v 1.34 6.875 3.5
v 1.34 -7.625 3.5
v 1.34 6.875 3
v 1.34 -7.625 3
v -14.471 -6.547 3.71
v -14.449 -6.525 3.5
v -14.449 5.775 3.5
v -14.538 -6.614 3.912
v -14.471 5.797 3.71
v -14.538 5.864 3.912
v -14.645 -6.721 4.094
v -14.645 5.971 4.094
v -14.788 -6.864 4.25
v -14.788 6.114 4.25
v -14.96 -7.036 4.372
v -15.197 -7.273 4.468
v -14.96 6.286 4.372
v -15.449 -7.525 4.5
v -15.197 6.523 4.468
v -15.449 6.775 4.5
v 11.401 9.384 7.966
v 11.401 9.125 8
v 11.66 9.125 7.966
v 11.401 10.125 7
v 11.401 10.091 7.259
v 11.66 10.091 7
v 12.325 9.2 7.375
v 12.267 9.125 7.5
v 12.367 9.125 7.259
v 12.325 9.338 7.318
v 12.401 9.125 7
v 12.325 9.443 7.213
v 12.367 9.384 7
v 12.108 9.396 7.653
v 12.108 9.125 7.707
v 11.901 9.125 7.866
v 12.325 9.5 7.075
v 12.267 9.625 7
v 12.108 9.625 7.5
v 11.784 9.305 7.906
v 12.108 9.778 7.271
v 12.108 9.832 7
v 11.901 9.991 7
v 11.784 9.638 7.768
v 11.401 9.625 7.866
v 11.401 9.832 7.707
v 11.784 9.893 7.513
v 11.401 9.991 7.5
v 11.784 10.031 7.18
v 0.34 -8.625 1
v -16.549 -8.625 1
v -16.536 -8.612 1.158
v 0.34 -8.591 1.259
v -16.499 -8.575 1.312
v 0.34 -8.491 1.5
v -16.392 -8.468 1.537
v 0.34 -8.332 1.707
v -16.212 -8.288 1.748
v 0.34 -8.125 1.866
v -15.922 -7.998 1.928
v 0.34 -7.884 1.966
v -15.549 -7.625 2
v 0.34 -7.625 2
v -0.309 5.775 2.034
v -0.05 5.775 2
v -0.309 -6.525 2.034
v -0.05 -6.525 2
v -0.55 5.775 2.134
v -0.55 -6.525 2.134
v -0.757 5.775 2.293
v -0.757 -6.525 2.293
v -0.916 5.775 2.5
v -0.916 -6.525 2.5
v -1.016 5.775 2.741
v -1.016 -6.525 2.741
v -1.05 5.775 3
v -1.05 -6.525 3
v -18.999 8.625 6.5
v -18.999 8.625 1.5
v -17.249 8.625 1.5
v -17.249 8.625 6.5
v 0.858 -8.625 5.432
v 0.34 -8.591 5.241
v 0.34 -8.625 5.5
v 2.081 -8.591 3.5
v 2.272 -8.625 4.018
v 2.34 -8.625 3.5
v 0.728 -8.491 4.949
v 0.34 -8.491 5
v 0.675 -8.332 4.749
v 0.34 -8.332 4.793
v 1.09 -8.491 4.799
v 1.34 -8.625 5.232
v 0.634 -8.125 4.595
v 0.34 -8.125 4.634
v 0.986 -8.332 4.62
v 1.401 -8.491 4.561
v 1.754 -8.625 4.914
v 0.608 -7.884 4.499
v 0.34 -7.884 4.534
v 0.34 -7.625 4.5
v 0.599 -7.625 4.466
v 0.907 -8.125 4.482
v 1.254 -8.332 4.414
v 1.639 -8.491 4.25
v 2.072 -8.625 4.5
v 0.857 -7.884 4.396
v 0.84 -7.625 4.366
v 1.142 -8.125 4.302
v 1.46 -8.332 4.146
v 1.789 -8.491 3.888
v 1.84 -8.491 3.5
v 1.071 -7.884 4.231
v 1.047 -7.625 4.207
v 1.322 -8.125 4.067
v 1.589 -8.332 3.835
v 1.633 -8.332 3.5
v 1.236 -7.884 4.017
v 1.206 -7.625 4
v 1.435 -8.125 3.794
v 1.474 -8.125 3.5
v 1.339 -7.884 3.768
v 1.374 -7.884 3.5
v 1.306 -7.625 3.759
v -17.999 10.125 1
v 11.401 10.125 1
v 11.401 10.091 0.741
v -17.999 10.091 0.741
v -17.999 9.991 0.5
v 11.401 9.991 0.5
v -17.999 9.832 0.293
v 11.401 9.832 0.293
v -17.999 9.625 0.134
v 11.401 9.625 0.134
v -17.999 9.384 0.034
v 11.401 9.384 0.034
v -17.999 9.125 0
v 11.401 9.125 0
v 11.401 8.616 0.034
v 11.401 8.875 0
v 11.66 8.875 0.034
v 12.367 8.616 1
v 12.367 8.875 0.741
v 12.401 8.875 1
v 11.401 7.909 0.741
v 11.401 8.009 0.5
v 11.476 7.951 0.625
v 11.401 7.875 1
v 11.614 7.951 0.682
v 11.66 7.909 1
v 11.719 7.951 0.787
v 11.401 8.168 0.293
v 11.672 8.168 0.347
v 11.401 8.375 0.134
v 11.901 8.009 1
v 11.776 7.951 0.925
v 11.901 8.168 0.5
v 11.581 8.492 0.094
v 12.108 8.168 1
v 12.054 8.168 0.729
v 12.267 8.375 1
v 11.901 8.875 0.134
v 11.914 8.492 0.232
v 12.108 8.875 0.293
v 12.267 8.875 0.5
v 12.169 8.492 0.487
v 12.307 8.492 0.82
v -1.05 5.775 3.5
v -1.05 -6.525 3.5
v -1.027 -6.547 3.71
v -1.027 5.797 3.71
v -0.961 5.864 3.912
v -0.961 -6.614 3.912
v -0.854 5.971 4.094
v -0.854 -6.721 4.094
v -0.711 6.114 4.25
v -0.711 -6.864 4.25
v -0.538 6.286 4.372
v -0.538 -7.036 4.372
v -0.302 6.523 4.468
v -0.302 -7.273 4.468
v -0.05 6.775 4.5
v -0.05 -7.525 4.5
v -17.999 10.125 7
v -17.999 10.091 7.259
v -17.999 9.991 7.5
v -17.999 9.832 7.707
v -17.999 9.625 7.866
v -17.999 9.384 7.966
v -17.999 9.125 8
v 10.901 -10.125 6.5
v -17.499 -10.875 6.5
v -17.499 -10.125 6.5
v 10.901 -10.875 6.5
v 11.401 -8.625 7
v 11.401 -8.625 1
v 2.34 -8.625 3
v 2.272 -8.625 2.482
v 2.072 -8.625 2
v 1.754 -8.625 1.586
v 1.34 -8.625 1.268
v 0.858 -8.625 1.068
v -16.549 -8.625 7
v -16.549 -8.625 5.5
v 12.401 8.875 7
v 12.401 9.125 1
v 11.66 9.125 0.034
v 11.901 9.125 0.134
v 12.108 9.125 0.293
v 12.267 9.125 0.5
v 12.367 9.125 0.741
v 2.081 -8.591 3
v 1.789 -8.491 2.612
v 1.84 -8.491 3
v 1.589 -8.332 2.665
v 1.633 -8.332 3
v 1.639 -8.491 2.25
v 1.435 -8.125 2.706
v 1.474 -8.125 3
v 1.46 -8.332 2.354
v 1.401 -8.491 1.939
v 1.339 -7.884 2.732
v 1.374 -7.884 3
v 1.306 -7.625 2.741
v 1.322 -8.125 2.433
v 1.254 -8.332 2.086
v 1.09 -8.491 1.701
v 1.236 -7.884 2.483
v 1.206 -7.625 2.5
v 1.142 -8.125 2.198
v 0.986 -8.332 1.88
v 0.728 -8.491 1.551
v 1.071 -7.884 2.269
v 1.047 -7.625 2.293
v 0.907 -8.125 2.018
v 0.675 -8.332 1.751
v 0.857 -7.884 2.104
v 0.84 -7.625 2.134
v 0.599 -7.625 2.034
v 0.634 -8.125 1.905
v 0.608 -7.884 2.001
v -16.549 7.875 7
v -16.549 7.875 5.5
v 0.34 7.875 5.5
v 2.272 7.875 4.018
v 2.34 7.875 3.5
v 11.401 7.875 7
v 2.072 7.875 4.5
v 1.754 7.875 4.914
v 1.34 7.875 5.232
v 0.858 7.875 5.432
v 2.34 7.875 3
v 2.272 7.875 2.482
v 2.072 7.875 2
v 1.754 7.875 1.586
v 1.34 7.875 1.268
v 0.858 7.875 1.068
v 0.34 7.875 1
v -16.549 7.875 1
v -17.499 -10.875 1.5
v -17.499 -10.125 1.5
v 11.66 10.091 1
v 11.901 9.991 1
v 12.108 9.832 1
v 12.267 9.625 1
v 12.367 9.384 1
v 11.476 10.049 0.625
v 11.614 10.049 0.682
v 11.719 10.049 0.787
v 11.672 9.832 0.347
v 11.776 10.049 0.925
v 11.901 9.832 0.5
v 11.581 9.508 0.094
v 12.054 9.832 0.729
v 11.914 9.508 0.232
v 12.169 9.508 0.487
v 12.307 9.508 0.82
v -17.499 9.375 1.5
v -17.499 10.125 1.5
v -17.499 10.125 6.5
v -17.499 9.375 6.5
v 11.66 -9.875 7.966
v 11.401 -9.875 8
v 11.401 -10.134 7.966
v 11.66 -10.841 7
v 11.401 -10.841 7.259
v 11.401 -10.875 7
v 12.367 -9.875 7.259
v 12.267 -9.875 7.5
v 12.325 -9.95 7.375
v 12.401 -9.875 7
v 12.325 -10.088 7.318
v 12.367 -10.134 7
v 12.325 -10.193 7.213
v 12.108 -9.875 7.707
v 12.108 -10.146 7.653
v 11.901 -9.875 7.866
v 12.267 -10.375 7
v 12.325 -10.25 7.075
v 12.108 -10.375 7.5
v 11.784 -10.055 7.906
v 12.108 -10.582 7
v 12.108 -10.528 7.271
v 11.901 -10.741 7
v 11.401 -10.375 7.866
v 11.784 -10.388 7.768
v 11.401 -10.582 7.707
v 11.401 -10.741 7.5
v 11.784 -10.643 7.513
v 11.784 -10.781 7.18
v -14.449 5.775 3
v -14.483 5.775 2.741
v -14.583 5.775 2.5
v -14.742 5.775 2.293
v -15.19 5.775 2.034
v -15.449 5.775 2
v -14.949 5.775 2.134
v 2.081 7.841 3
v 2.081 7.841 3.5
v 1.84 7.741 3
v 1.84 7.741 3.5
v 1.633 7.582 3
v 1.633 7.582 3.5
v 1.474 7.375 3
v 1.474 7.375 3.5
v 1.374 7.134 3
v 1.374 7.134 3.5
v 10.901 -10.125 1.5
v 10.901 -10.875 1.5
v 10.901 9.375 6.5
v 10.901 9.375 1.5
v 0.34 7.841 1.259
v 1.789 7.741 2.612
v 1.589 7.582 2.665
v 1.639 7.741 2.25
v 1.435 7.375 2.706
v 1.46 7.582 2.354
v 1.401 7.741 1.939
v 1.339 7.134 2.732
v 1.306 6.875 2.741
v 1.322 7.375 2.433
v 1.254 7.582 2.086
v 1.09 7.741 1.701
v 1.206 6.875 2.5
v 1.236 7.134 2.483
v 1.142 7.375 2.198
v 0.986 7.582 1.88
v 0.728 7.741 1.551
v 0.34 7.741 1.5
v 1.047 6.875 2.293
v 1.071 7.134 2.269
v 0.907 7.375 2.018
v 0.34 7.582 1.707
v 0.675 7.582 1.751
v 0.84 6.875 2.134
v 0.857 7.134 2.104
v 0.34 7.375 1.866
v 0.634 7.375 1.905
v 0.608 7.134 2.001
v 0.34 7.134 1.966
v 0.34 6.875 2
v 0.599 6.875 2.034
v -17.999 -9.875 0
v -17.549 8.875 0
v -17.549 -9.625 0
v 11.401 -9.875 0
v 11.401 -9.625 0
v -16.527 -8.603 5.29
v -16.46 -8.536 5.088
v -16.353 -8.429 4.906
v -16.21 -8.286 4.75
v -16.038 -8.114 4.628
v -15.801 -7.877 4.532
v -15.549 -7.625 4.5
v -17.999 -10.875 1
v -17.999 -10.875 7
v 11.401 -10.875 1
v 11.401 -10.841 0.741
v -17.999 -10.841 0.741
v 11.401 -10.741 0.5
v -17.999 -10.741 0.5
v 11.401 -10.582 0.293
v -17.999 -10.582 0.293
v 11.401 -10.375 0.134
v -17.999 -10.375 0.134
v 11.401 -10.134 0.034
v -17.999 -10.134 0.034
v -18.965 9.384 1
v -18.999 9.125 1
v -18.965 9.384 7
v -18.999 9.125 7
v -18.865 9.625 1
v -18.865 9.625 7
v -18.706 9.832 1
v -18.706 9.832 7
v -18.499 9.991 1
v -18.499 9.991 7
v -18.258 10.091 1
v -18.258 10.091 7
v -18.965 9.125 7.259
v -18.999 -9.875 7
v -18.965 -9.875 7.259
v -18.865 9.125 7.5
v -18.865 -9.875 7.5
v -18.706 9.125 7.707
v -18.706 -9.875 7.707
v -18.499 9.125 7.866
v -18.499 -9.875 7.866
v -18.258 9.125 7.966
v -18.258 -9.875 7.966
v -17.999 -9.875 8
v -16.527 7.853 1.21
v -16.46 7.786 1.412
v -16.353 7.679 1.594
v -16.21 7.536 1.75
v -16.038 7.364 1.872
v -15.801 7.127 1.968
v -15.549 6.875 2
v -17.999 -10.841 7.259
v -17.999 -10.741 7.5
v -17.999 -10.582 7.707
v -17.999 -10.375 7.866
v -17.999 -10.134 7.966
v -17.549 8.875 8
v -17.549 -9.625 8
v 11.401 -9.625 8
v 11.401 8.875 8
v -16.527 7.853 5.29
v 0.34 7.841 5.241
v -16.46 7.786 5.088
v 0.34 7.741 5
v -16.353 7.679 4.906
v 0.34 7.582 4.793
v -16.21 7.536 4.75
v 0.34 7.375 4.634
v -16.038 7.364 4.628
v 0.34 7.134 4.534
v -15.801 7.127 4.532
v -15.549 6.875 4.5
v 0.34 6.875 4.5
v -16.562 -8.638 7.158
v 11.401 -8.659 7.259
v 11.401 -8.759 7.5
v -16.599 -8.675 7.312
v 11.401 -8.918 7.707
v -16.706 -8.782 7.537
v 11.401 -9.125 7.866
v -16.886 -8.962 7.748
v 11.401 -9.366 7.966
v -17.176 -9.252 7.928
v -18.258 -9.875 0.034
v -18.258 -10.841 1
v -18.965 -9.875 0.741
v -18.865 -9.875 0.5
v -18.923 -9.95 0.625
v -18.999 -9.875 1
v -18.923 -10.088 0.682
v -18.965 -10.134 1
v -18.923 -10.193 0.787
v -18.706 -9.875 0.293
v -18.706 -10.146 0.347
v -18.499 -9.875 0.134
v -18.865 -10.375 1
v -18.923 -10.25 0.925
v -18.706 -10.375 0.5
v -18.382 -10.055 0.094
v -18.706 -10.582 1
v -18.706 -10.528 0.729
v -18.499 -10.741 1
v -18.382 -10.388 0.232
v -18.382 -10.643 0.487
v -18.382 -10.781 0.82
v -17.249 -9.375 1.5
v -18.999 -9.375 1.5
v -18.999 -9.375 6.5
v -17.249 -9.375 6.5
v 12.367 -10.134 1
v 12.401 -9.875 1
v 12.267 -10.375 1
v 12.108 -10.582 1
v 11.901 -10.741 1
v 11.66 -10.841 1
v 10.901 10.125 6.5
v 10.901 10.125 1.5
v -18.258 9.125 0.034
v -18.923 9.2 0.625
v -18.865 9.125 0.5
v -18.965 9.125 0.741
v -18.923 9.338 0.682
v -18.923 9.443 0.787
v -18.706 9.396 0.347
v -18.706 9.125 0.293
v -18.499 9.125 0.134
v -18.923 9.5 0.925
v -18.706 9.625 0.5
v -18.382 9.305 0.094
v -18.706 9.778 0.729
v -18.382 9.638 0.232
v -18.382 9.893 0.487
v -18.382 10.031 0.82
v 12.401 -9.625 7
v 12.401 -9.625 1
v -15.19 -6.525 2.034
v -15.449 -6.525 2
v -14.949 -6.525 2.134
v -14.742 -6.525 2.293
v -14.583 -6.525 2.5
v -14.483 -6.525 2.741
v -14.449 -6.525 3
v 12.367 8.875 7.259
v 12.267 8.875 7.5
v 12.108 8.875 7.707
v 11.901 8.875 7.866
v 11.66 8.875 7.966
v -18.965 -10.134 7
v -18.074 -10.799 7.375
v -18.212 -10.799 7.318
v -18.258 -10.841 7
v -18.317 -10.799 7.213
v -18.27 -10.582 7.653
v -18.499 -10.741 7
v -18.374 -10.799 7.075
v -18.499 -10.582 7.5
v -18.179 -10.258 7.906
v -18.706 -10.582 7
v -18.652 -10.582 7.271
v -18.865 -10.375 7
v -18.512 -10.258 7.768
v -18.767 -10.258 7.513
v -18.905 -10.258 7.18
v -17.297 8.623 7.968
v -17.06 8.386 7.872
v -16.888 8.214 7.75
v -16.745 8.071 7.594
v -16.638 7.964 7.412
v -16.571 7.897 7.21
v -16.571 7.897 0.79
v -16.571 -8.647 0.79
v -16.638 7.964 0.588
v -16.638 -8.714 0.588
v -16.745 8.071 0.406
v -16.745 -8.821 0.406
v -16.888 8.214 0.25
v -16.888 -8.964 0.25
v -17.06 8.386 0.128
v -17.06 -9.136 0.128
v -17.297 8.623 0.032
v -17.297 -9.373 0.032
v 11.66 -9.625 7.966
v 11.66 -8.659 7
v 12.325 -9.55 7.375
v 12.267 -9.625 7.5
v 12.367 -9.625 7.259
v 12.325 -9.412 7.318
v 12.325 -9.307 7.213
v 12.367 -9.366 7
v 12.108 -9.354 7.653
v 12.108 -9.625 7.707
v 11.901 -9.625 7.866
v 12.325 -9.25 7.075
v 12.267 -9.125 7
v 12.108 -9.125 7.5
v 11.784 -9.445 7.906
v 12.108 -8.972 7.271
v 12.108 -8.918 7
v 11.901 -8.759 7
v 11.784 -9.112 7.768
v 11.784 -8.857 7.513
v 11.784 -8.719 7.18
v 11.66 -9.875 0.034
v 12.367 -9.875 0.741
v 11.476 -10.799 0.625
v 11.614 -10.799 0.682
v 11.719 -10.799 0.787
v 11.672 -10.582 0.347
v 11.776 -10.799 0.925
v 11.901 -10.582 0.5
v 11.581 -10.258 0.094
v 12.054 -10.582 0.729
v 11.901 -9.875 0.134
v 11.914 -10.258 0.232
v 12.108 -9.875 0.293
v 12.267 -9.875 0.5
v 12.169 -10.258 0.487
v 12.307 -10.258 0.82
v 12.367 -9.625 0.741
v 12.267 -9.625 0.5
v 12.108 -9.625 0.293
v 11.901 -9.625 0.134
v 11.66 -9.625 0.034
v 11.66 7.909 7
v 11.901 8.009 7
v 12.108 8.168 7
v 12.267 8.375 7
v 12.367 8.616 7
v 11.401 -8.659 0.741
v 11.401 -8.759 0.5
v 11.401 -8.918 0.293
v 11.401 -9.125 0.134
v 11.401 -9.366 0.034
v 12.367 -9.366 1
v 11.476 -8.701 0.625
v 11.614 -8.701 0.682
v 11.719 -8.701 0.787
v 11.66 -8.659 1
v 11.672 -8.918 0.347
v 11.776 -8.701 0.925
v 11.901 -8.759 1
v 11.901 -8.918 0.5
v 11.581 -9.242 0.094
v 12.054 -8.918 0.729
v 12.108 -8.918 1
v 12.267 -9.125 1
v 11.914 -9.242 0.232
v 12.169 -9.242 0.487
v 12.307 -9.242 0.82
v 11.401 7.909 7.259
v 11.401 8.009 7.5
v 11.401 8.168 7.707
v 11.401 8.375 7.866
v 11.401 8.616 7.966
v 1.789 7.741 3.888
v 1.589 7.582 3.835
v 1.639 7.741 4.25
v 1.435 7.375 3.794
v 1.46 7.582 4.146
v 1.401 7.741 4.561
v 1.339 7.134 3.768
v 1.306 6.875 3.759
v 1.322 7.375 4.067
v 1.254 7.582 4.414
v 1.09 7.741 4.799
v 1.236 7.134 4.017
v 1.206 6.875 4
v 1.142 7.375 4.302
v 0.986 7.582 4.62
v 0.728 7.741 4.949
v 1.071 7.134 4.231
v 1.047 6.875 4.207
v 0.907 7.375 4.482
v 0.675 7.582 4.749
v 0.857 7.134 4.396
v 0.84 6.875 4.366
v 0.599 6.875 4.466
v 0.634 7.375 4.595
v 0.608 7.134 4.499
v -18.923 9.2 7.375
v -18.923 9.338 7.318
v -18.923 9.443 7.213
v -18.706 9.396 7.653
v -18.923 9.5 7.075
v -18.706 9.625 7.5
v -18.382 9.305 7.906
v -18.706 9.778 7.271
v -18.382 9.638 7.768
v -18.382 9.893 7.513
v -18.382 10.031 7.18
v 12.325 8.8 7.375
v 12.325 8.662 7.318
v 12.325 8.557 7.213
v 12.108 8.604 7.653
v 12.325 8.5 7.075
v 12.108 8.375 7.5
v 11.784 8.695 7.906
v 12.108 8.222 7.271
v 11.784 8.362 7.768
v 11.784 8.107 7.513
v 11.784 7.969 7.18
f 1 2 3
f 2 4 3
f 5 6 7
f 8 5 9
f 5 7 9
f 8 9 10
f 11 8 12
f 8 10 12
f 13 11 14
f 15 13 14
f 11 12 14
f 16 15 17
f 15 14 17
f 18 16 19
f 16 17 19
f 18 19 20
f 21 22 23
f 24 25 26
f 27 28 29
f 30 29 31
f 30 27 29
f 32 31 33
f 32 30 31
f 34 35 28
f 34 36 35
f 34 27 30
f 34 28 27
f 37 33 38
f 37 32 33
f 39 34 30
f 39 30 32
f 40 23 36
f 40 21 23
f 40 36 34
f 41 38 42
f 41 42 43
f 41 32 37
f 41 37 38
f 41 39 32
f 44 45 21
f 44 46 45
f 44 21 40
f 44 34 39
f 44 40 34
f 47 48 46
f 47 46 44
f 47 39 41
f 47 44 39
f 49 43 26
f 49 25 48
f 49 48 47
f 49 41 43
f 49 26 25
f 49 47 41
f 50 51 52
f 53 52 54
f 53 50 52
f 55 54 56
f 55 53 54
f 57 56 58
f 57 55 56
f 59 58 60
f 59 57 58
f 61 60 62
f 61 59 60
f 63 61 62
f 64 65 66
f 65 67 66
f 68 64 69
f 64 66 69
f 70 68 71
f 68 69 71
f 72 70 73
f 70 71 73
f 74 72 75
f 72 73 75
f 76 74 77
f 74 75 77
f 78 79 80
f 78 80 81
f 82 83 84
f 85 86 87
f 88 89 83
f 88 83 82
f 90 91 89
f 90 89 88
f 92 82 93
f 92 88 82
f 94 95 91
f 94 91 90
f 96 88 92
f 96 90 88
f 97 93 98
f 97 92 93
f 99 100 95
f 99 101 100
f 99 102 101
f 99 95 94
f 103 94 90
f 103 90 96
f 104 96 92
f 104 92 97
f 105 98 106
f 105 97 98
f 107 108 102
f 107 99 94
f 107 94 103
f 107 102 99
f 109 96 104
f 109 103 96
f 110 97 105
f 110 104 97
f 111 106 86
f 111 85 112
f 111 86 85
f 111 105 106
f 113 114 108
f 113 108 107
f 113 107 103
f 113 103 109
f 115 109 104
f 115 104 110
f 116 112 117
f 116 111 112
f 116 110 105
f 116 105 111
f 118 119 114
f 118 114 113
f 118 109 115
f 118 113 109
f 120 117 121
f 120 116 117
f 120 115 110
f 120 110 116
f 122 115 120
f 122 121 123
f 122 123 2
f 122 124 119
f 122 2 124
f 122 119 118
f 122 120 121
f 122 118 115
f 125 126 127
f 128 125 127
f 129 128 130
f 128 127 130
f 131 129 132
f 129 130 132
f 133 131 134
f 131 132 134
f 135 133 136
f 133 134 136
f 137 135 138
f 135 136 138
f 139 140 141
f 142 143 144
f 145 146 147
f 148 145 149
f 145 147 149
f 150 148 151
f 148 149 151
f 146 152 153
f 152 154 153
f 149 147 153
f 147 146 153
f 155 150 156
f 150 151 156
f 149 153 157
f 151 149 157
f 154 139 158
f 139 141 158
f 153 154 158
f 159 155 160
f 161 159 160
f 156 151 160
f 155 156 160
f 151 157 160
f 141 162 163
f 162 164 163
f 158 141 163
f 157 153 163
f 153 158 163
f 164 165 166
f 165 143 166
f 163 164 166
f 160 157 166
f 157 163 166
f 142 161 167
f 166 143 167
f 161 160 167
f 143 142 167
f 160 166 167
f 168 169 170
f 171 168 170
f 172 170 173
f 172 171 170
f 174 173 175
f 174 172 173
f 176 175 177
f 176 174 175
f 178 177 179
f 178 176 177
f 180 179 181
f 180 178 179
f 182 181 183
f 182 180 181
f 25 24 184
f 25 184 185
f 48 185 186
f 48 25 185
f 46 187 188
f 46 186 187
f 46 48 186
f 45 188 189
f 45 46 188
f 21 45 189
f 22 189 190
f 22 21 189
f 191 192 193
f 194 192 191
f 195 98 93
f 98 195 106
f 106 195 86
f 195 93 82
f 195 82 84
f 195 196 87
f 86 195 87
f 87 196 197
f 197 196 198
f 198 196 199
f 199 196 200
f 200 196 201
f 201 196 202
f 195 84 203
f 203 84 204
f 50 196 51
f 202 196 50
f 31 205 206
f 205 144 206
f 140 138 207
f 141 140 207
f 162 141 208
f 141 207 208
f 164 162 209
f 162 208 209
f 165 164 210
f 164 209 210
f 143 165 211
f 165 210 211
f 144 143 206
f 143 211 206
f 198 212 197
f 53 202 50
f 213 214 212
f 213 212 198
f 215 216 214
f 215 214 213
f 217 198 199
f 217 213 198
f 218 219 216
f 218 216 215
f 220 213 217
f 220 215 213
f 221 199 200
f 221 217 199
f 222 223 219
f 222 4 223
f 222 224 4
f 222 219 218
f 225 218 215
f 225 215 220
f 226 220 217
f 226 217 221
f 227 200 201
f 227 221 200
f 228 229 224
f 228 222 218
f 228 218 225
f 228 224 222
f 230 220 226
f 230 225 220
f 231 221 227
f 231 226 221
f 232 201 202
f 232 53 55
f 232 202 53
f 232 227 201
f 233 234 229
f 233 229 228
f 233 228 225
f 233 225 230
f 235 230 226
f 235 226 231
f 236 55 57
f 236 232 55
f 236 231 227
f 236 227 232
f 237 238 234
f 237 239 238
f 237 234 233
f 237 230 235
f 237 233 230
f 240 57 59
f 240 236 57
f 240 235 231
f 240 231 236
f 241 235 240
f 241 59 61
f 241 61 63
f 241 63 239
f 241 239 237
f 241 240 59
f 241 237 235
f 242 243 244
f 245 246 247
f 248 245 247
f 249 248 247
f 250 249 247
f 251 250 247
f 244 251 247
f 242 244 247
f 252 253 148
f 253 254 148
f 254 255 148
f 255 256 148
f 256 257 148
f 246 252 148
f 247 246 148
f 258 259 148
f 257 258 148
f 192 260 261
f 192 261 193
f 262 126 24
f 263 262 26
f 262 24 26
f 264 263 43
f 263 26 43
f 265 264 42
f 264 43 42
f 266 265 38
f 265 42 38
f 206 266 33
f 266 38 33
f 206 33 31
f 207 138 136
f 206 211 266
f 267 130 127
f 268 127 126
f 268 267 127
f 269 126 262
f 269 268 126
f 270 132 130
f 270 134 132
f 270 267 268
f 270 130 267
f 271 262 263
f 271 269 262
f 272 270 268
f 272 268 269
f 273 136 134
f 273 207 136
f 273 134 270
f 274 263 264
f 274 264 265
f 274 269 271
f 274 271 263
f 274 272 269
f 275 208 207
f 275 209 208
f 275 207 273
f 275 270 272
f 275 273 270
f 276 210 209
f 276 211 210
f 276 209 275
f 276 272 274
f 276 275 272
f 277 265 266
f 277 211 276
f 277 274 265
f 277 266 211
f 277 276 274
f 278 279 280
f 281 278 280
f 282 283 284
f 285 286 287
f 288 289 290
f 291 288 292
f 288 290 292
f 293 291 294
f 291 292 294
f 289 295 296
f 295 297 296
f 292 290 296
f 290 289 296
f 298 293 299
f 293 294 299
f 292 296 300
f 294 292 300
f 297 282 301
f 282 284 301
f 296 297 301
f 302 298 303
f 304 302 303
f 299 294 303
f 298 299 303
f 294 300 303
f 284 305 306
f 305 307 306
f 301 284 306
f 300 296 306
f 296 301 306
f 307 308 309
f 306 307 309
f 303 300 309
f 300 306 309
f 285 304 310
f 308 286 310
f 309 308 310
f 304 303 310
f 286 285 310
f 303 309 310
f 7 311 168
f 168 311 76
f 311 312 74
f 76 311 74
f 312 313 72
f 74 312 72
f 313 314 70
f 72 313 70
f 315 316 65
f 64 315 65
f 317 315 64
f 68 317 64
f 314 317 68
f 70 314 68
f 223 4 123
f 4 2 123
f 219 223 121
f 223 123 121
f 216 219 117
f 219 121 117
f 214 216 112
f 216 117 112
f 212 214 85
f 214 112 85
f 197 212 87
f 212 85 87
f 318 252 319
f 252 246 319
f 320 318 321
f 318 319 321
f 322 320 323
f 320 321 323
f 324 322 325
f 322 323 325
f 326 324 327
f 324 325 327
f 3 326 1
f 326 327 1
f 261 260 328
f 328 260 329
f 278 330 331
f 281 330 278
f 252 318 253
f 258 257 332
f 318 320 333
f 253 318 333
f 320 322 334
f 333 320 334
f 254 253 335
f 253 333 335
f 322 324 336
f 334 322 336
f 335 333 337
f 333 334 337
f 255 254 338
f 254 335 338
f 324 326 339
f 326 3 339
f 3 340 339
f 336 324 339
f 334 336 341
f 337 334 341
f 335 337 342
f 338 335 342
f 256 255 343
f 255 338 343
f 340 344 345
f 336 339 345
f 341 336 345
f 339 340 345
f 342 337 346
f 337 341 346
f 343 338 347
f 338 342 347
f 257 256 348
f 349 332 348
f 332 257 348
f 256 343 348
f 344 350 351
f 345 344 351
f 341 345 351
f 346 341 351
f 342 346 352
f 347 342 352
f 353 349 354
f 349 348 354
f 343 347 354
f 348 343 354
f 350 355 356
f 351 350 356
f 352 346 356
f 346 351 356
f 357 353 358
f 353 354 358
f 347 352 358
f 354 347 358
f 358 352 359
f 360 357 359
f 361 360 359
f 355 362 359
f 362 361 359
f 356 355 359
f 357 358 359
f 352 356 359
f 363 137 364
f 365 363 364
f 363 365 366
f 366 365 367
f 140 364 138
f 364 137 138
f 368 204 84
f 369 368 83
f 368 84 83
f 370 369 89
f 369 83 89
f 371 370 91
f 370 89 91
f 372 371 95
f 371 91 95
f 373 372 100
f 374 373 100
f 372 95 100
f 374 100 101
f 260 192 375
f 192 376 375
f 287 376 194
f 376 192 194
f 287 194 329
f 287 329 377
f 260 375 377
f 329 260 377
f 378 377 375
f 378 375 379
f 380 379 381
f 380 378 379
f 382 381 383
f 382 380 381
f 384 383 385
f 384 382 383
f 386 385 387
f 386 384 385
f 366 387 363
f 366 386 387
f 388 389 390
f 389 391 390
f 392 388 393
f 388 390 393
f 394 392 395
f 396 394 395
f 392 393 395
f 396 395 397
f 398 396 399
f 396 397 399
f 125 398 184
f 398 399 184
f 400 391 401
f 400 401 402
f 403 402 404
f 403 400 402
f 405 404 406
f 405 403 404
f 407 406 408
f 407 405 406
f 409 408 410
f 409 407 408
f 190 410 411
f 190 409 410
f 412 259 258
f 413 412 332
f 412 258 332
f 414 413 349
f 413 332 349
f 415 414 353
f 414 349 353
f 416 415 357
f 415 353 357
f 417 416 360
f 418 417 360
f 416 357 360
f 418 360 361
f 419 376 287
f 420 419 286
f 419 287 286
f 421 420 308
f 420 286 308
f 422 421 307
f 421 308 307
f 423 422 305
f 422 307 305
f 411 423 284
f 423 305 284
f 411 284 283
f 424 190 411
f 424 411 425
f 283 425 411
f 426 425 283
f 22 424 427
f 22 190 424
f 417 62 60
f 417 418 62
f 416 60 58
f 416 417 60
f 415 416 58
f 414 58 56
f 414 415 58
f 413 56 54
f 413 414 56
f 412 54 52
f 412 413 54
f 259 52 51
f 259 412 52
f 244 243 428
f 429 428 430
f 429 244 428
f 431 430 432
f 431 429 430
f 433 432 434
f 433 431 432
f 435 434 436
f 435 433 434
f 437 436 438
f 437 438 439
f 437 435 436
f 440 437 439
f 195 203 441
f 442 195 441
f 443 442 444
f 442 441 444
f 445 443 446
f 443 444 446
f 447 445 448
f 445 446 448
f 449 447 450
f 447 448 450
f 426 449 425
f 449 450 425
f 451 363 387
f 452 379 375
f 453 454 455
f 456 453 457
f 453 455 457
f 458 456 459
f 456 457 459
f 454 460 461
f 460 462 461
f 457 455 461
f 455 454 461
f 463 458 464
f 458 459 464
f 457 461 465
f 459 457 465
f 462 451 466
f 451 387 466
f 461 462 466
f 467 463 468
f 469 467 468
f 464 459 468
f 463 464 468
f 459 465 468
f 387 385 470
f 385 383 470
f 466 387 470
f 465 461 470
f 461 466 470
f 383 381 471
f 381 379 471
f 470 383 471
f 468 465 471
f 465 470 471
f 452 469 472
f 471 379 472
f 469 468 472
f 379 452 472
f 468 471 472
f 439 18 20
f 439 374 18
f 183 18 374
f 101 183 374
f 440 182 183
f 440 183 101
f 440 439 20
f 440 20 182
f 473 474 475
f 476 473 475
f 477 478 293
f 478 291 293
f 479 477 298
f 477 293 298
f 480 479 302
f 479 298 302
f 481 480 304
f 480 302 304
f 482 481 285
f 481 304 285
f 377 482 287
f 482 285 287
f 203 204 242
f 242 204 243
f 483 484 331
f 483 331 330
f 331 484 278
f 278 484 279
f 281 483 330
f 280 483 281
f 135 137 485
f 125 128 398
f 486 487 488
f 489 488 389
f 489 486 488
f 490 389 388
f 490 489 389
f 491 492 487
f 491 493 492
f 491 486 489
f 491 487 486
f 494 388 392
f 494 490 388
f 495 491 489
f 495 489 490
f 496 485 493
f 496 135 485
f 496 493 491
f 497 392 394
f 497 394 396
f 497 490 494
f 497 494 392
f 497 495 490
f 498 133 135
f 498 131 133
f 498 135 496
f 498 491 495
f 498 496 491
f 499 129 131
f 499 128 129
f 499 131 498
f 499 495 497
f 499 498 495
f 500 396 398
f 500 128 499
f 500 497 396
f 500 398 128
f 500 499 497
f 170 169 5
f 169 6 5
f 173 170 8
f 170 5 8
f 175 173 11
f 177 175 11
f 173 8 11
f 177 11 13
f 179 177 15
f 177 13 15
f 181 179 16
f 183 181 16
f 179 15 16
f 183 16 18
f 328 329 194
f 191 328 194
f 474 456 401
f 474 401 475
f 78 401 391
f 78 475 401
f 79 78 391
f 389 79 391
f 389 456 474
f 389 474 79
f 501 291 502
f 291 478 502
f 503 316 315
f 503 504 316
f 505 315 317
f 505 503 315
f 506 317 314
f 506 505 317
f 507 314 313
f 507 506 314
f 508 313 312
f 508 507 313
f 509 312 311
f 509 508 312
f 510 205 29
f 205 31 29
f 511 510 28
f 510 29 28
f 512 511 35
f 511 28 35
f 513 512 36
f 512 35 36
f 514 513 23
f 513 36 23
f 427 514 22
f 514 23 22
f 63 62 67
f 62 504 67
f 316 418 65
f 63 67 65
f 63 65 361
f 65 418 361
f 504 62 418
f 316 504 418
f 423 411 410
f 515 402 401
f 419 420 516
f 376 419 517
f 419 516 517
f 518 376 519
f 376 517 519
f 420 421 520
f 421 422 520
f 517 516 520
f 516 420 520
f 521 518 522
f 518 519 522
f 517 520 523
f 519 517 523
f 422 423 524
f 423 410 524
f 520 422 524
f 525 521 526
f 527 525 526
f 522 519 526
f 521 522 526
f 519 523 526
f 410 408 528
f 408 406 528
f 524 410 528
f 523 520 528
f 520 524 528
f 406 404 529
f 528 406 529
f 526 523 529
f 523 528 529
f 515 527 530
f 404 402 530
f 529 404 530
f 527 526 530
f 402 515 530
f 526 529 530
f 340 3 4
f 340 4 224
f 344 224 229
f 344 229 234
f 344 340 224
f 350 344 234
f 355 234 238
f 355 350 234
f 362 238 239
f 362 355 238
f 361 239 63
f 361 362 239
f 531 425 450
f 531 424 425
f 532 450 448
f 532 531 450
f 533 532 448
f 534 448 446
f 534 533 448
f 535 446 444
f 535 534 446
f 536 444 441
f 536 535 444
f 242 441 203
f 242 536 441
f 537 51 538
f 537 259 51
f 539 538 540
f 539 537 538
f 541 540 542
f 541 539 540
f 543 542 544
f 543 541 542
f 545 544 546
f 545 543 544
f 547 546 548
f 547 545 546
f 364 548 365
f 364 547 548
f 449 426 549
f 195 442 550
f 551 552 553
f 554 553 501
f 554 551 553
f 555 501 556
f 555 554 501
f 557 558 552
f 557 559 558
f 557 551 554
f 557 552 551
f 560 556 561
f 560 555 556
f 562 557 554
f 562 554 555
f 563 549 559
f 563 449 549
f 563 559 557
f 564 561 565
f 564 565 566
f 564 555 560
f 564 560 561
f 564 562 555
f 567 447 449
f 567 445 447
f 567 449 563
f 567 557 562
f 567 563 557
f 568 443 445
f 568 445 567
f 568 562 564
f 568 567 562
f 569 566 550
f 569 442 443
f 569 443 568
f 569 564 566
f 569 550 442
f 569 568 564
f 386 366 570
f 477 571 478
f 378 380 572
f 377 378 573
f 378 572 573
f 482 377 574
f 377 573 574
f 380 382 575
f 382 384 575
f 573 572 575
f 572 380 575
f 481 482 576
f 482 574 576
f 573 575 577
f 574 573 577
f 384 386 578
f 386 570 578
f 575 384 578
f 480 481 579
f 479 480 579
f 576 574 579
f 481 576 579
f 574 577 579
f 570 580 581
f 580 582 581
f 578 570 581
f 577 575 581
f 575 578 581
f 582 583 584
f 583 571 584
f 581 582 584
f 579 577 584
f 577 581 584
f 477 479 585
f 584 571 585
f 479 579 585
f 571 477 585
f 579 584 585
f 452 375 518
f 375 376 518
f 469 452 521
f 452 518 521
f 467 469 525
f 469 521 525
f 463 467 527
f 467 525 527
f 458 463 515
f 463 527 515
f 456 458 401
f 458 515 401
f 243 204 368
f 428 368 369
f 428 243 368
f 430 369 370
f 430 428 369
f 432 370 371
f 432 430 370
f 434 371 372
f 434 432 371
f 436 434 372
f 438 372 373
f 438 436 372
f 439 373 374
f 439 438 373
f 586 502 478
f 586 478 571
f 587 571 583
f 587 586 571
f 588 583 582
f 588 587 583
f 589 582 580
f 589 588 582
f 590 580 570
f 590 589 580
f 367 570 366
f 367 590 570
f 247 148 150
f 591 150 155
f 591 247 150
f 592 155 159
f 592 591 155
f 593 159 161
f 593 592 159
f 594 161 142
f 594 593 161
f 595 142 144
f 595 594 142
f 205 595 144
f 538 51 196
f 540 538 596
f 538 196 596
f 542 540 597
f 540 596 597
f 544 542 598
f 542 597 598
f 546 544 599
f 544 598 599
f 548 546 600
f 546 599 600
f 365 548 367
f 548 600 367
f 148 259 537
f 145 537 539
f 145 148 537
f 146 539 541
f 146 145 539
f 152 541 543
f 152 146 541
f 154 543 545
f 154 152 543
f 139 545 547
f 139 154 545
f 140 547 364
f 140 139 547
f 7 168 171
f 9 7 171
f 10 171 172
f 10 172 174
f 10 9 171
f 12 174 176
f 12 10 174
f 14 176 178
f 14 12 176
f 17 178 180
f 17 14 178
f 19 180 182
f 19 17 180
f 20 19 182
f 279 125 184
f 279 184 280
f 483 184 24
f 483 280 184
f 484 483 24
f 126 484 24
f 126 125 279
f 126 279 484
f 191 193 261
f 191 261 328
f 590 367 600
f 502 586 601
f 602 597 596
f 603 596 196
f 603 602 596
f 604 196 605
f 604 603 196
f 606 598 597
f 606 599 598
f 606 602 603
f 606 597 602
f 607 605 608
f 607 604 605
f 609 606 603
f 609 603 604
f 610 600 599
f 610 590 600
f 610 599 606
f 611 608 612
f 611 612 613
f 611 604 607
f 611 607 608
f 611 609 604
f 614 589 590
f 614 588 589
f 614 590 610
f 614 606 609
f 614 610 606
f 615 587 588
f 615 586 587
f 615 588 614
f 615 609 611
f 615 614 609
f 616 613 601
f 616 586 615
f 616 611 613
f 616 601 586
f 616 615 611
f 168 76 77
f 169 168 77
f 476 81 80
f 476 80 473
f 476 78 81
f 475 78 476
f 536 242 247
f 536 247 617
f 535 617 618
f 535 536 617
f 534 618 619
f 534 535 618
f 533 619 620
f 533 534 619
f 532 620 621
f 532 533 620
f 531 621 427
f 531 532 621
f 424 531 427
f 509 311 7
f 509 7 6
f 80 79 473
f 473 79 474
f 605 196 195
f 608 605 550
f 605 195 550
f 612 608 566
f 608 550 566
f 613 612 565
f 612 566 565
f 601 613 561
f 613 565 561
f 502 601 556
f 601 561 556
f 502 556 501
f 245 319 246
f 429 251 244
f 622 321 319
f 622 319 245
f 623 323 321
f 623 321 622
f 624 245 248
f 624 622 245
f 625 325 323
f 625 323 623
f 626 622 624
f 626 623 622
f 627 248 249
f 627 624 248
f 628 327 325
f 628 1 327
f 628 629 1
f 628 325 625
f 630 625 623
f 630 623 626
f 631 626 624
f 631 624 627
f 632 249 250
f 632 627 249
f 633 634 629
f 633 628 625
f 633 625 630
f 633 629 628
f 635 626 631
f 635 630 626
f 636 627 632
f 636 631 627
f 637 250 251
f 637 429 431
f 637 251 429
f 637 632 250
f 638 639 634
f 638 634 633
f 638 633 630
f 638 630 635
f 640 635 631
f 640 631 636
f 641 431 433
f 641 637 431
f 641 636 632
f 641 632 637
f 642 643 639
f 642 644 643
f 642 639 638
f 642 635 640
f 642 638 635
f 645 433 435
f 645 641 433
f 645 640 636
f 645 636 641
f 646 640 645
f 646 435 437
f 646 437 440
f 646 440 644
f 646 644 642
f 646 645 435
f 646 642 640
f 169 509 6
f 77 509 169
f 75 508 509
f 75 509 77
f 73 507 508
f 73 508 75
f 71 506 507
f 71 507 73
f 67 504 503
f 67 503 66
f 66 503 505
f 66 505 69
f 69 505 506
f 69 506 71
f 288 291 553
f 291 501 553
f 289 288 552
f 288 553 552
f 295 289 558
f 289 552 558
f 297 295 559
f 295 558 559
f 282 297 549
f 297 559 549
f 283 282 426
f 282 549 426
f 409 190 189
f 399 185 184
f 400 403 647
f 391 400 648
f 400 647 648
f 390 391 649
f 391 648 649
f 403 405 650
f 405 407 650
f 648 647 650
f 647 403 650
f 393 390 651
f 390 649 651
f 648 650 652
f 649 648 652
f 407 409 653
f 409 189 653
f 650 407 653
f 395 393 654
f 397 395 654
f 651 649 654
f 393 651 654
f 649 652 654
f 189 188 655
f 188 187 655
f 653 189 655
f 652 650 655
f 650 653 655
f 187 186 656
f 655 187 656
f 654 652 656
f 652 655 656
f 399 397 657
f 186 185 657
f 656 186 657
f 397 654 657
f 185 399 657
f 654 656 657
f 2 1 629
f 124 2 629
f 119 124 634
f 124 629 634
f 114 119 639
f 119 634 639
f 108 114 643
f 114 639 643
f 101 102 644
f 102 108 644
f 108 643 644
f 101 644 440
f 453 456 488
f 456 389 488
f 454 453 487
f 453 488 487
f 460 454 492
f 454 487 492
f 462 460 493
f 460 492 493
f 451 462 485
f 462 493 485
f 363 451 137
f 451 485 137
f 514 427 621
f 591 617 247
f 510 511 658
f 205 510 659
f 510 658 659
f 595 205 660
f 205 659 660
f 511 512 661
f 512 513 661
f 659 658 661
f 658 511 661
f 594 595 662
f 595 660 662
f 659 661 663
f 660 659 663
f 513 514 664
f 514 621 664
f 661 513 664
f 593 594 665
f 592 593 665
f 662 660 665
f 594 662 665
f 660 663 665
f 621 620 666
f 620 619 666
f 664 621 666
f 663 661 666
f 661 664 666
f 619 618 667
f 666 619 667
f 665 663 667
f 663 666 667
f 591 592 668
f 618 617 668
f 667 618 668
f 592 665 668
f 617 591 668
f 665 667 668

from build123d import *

# Parameters (mm, degrees)
F0_W      = 33.4
F0_H      = 23
F1_DEPTH  = 8
F0_W_2    = 17.8890476892
F0_H_2    = 16.5
F2_DEPTH  = 4.5
F3_DEPTH  = 1
F4_DEPTH  = 1
F5_DEPTH  = 1
F6_DEPTH  = 1
F7_DEPTH  = 2
F8_W      = 13.3992488682
F8_H      = 12.2999999374
F9_DEPTH  = 3.4
F11_W     = 28.4
F11_H     = 5
F12_DEPTH = 0.75
F13_W     = 28.4
F13_H     = 5
F14_DEPTH = 0.75
F15_W     = 18
F15_H     = 5
F16_DEPTH = 1.75
F10_W     = 16.5
F10_H     = 8
F17_DEPTH = 2.5
F18_R     = 0.99999


# Not quite as in the source:
# - a fillet or chamfer is up to 0.001 mm smaller than in the source, because OpenCascade refuses the exact size
# - a feature names something its author has since deleted; it is built from what else it names


with BuildPart() as f1:
    # F0 (on Top) → F1 (new body)
    with BuildSketch(Plane.XY):
        with Locations((-3.299, -0.375)):
            Rectangle(F0_W, F0_H)
        Polygon((1.3400476892, 7.875), (9.951, 7.875), (9.951, -8.625), (1.3400476892, -8.625), (-16.549, -8.625), (-16.549, 7.875), align=None, mode=Mode.SUBTRACT)
    extrude(amount=F1_DEPTH)

    # F0 (on Top) → F2 (join)
    with BuildSketch(Plane.XY):
        with Locations((-7.6044761554, -0.375)):
            Rectangle(F0_W_2, F0_H_2)
    extrude(amount=F2_DEPTH)

    # F3 (cut): a face of the model
    f3_faces = [f1.faces().sort_by_distance(p)[0] for p in [
        (-3.299, -11.875, 4),
    ]]
    extrude(f3_faces, amount=-F3_DEPTH, mode=Mode.SUBTRACT)

    # F4 (cut): a face of the model
    f4_faces = [f1.faces().sort_by_distance(p)[0] for p in [
        (13.401, 0.125, 4),
    ]]
    extrude(f4_faces, amount=-F4_DEPTH, mode=Mode.SUBTRACT)

    # F5 (cut): a face of the model
    f5_faces = [f1.faces().sort_by_distance(p)[0] for p in [
        (-3.799, 11.125, 4),
    ]]
    extrude(f5_faces, amount=-F5_DEPTH, mode=Mode.SUBTRACT)

    # F6 (cut): a face of the model
    f6_faces = [f1.faces().sort_by_distance(p)[0] for p in [
        (-19.999, -0.375, 4),
    ]]
    extrude(f6_faces, amount=-F6_DEPTH, mode=Mode.SUBTRACT)

    # F0 (on Top) → F7 (cut)
    with BuildSketch(Plane.XY):
        with Locations((-7.6044761554, -0.375)):
            Rectangle(F0_W_2, F0_H_2)
    extrude(amount=F7_DEPTH, mode=Mode.SUBTRACT)

    # F8 (on face) → F9 (cut)
    with BuildSketch(Plane(origin=(0, 0, 2), x_dir=(1, 0, 0), z_dir=(0, 0, -1))):
        with Locations((-7.7493755346, 0.375)):
            Rectangle(F8_W, F8_H)
    extrude(amount=-F9_DEPTH, mode=Mode.SUBTRACT)

    # F11 (on face) → F12 (cut)
    with BuildSketch(Plane.XZ.offset(10.875)):
        with Locations((-3.299, 4)):
            Rectangle(F11_W, F11_H)
    extrude(amount=-F12_DEPTH, mode=Mode.SUBTRACT)

    # F13 (on face) → F14 (cut)
    with BuildSketch(Plane(origin=(0, 10.125, 0), x_dir=(-1, 0, 0), z_dir=(0, 1, 0))):
        with Locations((3.299, 4)):
            Rectangle(F13_W, F13_H)
    extrude(amount=-F14_DEPTH, mode=Mode.SUBTRACT)

    # F15 (on face) → F16 (cut)
    with BuildSketch(Plane(origin=(-18.999, 0, 0), x_dir=(0, -1, 0), z_dir=(-1, 0, 0))):
        with Locations((0.375, 4)):
            Rectangle(F15_W, F15_H)
    extrude(amount=-F16_DEPTH, mode=Mode.SUBTRACT)

    # F10 (on face) → F17 (cut)
    with BuildSketch(Plane.YZ.offset(12.401)):
        with Locations((-0.375, 4)):
            Rectangle(F10_W, F10_H)
    extrude(amount=-F17_DEPTH, mode=Mode.SUBTRACT)

    # F18 (radius 1 in the source; OpenCascade refuses exactly that, so slightly less here)
    f18_edges = [f1.edges().sort_by_distance(p)[0] for p in [
        (-3.299, 10.125, 8),
        (-2.074, 7.875, 8),
        (-18.999, -0.375, 8),
        (-16.549, -0.375, 8),
        (-2.074, -8.625, 8),
        (-3.299, -10.875, 8),
        (12.401, -9.75, 8),
        (12.401, 9, 8),
        (12.401, 9, 0),
        (12.401, -9.75, 0),
        (-3.299, 10.125, 0),
        (-3.299, -10.875, 0),
        (-18.999, -0.375, 0),
        (-2.074, -8.625, 0),
        (-16.549, -0.375, 0),
        (-2.074, 7.875, 0),
        (12.401, -10.875, 4),
        (12.401, -8.625, 4),
        (12.401, 7.875, 4),
        (12.401, 10.125, 4),
        (-18.999, -10.875, 4),
        (-18.999, 10.125, 4),
        (-14.449, -0.375, 4.5),
        (-1.049751, -0.375, 4.5),
        (-7.604476, 7.875, 2),
        (-16.549, -0.375, 2),
        (-7.604476, -8.625, 2),
        (-1.049751, -0.375, 2),
        (-14.449, -0.375, 2),
        (-16.549, -0.375, 4.5),
        (1.340048, -0.375, 4.5),
        (1.340048, -0.375, 2),
        (1.340048, 7.875, 3.25),
        (-7.604476, 7.875, 4.5),
        (-7.604476, -8.625, 4.5),
        (-7.749376, -6.525, 4.5),
        (-7.749376, 5.775, 4.5),
        (1.340048, -8.625, 3.25),
    ]]
    fillet(f18_edges, radius=F18_R)


solid = f1.part
